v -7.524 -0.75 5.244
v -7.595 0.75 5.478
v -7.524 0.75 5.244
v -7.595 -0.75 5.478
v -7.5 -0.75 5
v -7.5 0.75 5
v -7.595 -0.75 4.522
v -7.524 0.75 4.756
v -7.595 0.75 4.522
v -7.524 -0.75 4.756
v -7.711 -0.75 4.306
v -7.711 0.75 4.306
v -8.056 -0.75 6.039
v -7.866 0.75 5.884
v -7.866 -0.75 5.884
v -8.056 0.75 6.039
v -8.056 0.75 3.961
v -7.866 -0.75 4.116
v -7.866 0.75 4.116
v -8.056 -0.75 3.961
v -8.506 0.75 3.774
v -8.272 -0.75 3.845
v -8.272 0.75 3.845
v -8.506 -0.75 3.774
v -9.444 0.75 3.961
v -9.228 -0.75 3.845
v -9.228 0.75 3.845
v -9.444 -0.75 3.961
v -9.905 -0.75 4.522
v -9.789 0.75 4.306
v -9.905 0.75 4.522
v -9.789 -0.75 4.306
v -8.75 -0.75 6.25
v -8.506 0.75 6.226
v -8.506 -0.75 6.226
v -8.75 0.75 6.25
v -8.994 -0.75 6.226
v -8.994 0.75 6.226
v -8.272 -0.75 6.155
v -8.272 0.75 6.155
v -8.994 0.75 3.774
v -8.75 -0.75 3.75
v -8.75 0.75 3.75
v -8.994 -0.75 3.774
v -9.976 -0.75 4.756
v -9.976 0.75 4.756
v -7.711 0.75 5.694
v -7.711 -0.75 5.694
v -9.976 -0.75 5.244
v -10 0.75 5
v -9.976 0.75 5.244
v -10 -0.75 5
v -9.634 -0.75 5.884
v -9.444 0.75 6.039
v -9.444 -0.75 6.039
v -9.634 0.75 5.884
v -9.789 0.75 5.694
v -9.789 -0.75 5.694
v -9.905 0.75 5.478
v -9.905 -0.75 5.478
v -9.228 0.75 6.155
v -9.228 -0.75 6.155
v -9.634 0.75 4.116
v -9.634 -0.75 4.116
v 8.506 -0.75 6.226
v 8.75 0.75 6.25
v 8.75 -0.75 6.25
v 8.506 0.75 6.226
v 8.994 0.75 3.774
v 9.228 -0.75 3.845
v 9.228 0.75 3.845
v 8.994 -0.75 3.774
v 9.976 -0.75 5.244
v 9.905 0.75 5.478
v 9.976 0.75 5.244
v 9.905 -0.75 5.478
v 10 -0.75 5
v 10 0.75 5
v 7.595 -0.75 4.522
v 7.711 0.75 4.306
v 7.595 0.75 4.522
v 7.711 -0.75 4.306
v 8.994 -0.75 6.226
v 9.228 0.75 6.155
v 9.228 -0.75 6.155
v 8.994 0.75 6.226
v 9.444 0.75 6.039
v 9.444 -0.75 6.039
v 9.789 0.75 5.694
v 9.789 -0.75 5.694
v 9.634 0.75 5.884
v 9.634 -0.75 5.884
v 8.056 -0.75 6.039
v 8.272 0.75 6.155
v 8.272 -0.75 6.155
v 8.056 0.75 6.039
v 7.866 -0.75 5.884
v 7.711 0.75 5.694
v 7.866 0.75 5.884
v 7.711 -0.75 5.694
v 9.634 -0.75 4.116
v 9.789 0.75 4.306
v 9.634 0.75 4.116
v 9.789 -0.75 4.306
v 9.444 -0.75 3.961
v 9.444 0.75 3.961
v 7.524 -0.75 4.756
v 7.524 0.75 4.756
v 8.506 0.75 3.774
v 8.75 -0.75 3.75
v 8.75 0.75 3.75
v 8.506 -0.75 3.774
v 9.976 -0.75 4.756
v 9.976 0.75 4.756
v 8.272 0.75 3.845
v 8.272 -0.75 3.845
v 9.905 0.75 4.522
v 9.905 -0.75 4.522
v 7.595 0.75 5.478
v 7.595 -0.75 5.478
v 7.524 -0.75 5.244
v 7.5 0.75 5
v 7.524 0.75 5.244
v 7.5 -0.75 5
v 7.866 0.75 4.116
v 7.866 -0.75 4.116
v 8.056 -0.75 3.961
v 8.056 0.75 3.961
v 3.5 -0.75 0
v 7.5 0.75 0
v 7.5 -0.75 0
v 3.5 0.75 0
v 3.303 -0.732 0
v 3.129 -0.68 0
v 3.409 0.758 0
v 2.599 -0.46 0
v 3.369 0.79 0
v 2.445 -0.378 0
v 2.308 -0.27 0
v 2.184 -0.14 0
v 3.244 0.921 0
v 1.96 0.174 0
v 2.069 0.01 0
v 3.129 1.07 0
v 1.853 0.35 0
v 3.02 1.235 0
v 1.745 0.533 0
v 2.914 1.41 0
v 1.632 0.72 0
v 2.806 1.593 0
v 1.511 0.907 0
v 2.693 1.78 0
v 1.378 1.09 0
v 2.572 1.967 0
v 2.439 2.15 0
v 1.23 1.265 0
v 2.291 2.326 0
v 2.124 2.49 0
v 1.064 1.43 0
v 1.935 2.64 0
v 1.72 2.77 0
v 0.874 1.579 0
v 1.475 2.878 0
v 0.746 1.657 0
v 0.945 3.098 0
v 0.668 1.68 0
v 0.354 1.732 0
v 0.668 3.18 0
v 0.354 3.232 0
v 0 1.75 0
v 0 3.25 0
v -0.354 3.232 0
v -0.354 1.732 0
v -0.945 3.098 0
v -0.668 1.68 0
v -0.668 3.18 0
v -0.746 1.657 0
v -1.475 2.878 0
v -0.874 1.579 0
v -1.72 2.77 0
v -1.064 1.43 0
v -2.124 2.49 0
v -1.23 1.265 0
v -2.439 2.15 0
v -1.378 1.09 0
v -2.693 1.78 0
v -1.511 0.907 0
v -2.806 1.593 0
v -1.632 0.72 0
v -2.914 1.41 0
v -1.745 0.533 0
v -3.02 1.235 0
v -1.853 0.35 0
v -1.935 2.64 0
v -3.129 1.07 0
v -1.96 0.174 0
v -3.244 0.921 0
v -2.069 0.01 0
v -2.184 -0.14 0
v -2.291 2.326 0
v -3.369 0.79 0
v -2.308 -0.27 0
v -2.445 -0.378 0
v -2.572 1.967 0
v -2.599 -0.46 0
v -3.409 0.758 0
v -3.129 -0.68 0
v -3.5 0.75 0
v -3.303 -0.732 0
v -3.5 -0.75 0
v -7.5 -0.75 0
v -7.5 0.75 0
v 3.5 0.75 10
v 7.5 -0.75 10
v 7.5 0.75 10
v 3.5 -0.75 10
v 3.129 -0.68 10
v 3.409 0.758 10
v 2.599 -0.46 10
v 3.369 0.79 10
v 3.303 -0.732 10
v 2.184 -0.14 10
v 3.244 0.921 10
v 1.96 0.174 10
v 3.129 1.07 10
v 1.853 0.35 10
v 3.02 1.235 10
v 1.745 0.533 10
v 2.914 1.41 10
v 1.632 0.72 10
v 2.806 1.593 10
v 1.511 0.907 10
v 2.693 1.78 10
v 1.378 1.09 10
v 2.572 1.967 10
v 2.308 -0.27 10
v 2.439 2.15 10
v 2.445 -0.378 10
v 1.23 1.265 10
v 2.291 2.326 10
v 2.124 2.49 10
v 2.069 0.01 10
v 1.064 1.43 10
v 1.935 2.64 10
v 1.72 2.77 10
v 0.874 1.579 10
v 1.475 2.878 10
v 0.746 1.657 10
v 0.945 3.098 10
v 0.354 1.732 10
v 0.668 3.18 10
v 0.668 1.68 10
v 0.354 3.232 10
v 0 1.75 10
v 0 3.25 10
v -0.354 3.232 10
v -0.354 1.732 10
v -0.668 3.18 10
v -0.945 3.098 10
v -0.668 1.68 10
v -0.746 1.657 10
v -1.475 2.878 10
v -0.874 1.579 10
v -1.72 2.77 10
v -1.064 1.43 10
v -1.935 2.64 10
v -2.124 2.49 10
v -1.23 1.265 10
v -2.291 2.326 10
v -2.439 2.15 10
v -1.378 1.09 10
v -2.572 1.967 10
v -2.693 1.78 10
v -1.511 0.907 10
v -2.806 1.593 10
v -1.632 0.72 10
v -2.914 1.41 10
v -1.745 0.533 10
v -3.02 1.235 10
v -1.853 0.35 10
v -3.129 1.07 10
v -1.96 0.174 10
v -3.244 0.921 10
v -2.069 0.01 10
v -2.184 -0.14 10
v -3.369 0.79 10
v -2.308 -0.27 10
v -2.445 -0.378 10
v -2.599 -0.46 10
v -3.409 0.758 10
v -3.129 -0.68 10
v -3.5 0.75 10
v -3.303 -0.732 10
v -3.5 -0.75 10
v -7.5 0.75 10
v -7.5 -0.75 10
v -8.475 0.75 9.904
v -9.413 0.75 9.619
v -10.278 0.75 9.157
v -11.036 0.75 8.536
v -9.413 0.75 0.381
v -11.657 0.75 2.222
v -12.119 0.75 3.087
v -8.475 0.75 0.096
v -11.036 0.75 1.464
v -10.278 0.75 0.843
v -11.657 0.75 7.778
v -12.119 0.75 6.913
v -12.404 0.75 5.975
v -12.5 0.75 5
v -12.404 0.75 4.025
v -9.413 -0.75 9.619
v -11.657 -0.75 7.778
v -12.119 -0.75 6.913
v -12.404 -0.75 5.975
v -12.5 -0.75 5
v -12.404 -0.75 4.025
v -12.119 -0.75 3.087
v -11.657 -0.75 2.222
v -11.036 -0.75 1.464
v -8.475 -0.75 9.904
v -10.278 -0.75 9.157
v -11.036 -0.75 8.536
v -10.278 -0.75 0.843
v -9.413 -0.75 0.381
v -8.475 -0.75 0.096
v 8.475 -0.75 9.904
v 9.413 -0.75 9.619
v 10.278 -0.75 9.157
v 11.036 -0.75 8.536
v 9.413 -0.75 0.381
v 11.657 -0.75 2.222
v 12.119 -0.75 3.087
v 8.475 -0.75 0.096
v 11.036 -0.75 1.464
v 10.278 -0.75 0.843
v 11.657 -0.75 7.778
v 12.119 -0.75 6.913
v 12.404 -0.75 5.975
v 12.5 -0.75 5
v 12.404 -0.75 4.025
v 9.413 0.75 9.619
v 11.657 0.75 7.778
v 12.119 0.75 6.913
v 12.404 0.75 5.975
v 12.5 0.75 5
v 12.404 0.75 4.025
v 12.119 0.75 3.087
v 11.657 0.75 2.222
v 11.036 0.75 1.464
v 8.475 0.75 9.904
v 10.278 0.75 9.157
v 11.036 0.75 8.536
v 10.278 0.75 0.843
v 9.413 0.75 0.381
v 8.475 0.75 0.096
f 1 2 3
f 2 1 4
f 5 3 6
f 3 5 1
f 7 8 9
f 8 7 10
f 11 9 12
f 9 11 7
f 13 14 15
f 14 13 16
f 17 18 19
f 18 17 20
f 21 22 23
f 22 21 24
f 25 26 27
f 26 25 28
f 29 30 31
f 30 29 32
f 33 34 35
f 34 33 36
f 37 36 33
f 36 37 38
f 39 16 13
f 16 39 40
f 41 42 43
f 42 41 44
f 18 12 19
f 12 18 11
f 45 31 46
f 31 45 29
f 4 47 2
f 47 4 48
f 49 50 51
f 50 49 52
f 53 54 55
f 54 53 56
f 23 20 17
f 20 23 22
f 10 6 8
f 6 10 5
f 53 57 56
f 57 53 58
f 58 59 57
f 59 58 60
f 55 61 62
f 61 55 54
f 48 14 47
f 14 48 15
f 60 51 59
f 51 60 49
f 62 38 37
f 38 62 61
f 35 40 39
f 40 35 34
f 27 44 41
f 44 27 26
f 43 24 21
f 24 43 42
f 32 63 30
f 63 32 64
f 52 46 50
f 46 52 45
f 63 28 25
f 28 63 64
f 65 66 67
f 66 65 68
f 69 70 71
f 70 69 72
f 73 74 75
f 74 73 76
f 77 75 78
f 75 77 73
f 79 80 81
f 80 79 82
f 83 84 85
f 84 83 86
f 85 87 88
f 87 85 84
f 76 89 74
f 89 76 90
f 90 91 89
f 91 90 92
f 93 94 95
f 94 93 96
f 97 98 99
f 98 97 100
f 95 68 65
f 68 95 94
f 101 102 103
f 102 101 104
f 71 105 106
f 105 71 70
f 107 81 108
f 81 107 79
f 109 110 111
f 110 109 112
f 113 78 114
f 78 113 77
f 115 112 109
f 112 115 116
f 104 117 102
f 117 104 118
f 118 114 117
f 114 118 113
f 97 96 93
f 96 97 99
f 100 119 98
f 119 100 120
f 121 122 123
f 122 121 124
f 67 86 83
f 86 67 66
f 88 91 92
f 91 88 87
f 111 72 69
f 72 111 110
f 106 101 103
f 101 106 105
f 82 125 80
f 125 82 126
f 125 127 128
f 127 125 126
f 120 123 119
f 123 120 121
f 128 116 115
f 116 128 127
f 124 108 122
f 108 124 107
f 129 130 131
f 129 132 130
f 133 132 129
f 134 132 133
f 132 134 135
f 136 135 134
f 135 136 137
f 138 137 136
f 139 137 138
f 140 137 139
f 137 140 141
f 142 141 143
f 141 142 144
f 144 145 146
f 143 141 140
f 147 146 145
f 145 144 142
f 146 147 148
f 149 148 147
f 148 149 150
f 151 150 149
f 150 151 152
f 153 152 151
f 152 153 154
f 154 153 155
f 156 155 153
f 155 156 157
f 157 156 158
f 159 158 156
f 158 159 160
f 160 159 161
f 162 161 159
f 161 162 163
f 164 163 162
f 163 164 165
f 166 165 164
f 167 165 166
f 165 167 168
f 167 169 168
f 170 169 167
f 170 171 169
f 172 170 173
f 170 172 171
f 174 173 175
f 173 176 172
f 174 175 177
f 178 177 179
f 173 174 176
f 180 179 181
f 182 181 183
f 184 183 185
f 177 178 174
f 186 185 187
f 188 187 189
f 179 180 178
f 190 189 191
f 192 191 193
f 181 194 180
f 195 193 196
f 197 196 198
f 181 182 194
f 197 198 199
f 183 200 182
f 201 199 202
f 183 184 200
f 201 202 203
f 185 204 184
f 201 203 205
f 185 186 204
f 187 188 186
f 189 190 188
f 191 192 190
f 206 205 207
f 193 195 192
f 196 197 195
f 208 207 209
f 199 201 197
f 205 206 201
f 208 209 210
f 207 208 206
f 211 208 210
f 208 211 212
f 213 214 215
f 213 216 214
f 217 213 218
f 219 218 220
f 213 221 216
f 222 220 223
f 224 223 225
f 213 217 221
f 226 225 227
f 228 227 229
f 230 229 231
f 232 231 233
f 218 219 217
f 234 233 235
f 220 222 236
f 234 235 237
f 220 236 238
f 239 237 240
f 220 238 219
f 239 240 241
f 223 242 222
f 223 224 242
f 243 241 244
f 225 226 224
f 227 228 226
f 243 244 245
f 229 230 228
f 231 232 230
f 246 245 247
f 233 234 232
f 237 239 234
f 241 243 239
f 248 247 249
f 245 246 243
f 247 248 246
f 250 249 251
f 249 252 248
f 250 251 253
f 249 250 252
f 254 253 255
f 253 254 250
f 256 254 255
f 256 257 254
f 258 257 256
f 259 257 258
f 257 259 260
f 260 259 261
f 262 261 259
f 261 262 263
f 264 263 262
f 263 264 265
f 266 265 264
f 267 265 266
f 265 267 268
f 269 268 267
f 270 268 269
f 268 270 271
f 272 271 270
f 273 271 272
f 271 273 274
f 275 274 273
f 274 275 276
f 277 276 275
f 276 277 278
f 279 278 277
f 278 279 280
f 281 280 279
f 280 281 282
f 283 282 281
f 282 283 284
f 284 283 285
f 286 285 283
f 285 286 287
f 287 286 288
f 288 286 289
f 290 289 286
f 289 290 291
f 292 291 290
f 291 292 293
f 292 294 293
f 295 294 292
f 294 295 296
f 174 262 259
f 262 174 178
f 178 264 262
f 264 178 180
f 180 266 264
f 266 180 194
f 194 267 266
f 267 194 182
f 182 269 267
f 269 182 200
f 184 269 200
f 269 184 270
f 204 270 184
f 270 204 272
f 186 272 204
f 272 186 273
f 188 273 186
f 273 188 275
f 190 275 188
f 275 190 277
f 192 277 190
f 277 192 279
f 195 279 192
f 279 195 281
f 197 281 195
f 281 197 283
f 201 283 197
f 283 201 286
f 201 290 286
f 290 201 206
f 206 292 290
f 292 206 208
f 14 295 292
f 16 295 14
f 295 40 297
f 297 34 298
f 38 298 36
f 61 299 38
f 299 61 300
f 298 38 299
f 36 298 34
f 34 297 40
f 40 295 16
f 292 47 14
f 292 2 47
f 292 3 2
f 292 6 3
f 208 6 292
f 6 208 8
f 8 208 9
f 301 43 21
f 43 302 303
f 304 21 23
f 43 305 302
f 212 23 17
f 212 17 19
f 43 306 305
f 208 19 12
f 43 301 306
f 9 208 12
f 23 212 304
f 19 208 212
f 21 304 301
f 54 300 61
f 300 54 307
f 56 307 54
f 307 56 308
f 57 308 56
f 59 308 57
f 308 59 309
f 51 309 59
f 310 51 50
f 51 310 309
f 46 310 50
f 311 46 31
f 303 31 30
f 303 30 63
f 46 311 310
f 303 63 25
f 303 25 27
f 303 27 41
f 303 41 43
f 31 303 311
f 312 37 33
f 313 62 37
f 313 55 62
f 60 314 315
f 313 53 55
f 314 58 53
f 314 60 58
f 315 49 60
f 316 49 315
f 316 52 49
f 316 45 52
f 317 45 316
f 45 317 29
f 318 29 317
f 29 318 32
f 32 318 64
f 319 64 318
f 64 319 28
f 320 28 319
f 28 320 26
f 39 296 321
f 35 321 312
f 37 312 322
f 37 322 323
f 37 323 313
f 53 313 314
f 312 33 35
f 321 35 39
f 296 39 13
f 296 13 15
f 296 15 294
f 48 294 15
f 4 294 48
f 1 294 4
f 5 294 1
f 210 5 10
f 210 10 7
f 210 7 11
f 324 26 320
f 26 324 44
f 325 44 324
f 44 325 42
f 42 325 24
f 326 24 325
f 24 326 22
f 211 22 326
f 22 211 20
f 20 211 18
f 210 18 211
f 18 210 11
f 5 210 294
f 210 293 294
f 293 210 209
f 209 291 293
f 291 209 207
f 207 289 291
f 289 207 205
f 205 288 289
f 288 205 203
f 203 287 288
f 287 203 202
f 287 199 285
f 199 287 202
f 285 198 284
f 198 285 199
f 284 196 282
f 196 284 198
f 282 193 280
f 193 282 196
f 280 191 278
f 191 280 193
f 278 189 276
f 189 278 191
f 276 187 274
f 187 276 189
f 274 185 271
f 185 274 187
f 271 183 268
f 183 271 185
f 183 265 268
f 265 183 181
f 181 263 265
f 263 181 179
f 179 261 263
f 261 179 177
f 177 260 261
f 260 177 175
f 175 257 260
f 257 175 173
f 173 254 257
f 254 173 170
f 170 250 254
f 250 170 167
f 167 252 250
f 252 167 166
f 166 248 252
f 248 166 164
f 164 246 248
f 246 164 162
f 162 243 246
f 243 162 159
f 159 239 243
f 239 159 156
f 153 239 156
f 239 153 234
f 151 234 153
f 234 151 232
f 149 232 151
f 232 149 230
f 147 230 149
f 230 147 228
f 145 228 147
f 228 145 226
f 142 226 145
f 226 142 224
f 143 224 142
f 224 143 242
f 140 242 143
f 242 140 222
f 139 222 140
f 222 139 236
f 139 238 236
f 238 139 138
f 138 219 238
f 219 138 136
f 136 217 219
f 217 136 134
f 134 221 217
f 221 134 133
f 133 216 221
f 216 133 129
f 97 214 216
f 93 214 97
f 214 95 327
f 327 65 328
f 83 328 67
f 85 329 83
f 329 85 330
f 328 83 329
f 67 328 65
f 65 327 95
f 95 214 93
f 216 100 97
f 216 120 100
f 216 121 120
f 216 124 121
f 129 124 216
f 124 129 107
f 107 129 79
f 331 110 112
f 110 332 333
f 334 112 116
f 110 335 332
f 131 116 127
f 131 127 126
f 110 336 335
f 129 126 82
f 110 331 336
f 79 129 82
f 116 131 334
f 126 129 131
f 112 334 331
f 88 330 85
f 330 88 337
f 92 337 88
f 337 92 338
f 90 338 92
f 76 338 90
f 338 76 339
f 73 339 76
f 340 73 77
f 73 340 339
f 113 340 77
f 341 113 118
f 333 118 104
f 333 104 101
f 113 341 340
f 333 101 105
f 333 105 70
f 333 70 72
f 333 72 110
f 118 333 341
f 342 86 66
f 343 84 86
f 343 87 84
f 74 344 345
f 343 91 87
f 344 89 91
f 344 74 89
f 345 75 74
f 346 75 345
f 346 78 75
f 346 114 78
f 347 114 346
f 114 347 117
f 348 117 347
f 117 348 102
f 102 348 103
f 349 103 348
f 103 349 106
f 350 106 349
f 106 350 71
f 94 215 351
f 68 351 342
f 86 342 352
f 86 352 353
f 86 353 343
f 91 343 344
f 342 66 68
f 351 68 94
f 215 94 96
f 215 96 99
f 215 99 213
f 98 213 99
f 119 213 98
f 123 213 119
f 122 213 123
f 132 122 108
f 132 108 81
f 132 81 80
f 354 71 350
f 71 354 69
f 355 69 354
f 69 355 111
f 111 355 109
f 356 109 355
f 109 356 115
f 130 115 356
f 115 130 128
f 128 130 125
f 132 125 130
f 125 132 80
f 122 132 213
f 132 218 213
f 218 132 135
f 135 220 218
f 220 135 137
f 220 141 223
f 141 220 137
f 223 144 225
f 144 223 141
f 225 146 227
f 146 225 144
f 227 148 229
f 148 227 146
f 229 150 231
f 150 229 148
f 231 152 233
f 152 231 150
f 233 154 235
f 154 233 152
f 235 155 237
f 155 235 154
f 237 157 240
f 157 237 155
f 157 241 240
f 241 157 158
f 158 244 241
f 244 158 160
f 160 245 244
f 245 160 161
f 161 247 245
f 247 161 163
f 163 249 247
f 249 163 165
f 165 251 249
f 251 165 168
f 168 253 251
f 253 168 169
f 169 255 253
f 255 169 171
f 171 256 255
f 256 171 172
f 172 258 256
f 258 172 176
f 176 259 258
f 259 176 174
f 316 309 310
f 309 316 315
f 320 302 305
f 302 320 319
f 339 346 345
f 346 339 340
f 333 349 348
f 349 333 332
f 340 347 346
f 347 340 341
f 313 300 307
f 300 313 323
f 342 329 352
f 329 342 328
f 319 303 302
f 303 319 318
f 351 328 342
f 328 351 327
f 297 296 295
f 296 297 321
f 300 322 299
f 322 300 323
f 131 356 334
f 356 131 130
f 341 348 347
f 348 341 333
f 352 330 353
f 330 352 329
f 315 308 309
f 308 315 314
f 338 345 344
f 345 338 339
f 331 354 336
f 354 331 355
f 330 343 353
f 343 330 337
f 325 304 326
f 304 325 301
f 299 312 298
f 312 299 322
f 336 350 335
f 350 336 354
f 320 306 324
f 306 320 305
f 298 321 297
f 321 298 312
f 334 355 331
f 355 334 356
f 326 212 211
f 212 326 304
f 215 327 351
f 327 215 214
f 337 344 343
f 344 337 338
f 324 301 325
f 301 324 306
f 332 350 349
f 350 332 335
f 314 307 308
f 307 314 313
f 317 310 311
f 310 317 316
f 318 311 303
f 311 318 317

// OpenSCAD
cableDiameter=3.5;
tieThickness=1.5;
tieWidth=10;
tieLength=25;
screwHoleDiameter=2.5;

module end_of_parameters_dummy() {}

//use <bezier.scad>;
/*
Copyright (c) 2017 Alexander R. Pruss.

Licensed under any Creative Commons Attribution license you like or under the
following MIT License.

Permission is hereby granted, free of charge, to any person obtaining a copy
of this software and associated documentation files (the "Software"), to deal
in the Software without restriction, including without limitation the rights
to use, copy, modify, merge, publish, distribute, sublicense, and/or sell
copies of the Software, and to permit persons to whom the Software is
furnished to do so, subject to the following conditions:

The above copyright notice and this permission notice shall be included in all
copies or substantial portions of the Software.

THE SOFTWARE IS PROVIDED "AS IS", WITHOUT WARRANTY OF ANY KIND, EXPRESS OR
IMPLIED, INCLUDING BUT NOT LIMITED TO THE WARRANTIES OF MERCHANTABILITY,
FITNESS FOR A PARTICULAR PURPOSE AND NONINFRINGEMENT. IN NO EVENT SHALL THE
AUTHORS OR COPYRIGHT HOLDERS BE LIABLE FOR ANY CLAIM, DAMAGES OR OTHER
LIABILITY, WHETHER IN AN ACTION OF CONTRACT, TORT OR OTHERWISE, ARISING FROM,
OUT OF OR IN CONNECTION WITH THE SOFTWARE OR THE USE OR OTHER DEALINGS IN THE
SOFTWARE.

*/


// Public domain Bezier stuff from www.thingiverse.com/thing:8443
function BEZ03(u) = pow((1-u), 3);
function BEZ13(u) = 3*u*(pow((1-u),2));
function BEZ23(u) = 3*(pow(u,2))*(1-u);
function BEZ33(u) = pow(u,3);
function PointAlongBez4(p0, p1, p2, p3, u) = [for (i=[0:len(p0)-1])
	BEZ03(u)*p0[i]+BEZ13(u)*p1[i]+BEZ23(u)*p2[i]+BEZ33(u)*p3[i]];
// End public domain Bezier stuff

function REPEAT_MIRRORED(v) = ["m",v];
function SMOOTH_REL(x) = ["r",x];
function SMOOTH_ABS(x) = ["a",x];
function SYMMETRIC() = ["r",1];
function OFFSET(v) = ["o",v];
function SHARP() = OFFSET([0,0,0]);
function POLAR(r,angle) = OFFSET(r*[cos(angle),sin(angle)]);
function POINT_IS_SPECIAL(v) = (v[0]=="r" || v[0]=="a" || v[0]=="o");

// this does NOT handle offset type points; to handle those, use DecodeBezierOffsets()
function getControlPoint(cp,node,otherCP) = cp[0]=="r"?(node+cp[1]*(node-otherCP)):( cp[0]=="a"?node+cp[1]*(node-otherCP)/norm(node-otherCP):cp );

function onLine2(a,b,c,eps=1e-4) =
    norm(c-a) <= eps ? true
        : norm(b-a) <= eps ? false /* to be safe */
            : abs((c[1]-a[1])*(b[0]-a[0]) - (b[1]-a[1])*(c[0]-a[0])) <= eps * eps && norm(c-a) <= eps + norm(b-a);

function isStraight2(p1,c1,c2,p2,eps=1e-4) =
    len(p1) == 2 &&
    onLine2(p1,p2,c1,eps=eps) && onLine2(p2,p1,c2,eps=eps);

function Bezier2(p,index=0,precision=0.05,rightEndPoint=true) = let(nPoints=ceil(1/precision))
    isStraight2(p[index],p[index+1],p[index+2],p[index+3]) ? (rightEndPoint?[p[index+0],p[index+3]]:[p[index+0]] ) :
    [for (i=[0:nPoints-(rightEndPoint?0:1)]) PointAlongBez4(p[index+0],p[index+1],p[index+2],p[index+3],i/nPoints)];

function flatten(listOfLists) = [ for(list = listOfLists) for(item = list) item ];


// p is a list of points, in the format:
// [node1,control1,control2,node2,control3, control4,node3, ...]
// You can replace inner control points with:
//   SYMMETRIC: uses a reflection of the control point on the other side of the node
//   SMOOTH_REL(x): like SYMMETRIC, but the distance of the control point to the node is x times the distance of the other control point to the node
//   SMOOTH_ABS(x): like SYMMETRIC, but the distance of the control point to the node is exactly x
// You can also replace any control point with:
//   OFFSET(v): puts the control point at the corresponding node plus the vector v
//   SHARP(): equivalent to OFFSET([0,0]); useful for straight lines
//   POLAR(r,angle): like OFFSET, except the offset is specified in polar coordinates

function DecodeBezierOffset(control,node) = control[0] == "o" ? node+control[1] : control;

function _mirrorMatrix(normalVector) = let(v = normalVector/norm(normalVector)) len(v)<3 ? [[1-2*v[0]*v[0],-2*v[0]*v[1]],[-2*v[0]*v[1],1-2*v[1]*v[1]]] : [[1-2*v[0]*v[0],-2*v[0]*v[1],-2*v[0]*v[2]],[-2*v[0]*v[1],1-2*v[1]*v[1],-2*v[1]*v[2]],[-2*v[0]*v[2],-2*v[1]*v[2],1-2*v[2]*v[2]]];

function _correctLength(p,start=0) =
    start >= len(p) || p[start][0] == "m" ? 3*floor(start/3)+1 : _correctLength(p,start=start+1);

function _trimArray(a, n) = [for (i=[0:n-1]) a[i]];

function _transformPoint(matrix,a) =
    let(n=len(a))
        len(matrix[0])==n+1 ?
            _trimArray(matrix * concat(a,[1]), n)
            : matrix * a;

function _transformPath(matrix,path) =
    [for (a=path) _transformPoint(matrix,a)];

function _reverseArray(array) = let(n=len(array)) [for (i=[0:n-1]) array[n-1-i]];

function _stitchPaths(a,b) = let(na=len(a)) [for (i=[0:na+len(b)-2]) i<na? a[i] : b[i-na+1]-b[0]+a[na-1]];

// replace all OFFSET/SHARP/POLAR points with coordinates
function DecodeBezierOffsets(p) = [for (i=[0:_correctLength(p)-1]) i%3==0?p[i]:(i%3==1?DecodeBezierOffset(p[i],p[i-1]):DecodeBezierOffset(p[i],p[i+1]))];

function _mirrorPaths(basePath, control, start) =
    control[start][0] == "m" ? _mirrorPaths(_stitchPaths(basePath,_reverseArray(_transformPath(_mirrorMatrix( control[start][1] ),basePath))), control, start+1) : basePath;

function DecodeSpecialBezierPoints(p0) =
    let(
        l = _correctLength(p0),
        doMirror = len(p0)>l && p0[l][0] == "m",
        p=DecodeBezierOffsets(p0),
        basePath = [for (i=[0:l-1]) i%3==0?p[i]:(i%3==1?getControlPoint(p[i],p[i-1],p[i-2]):getControlPoint(p[i],p[i+1],p[i+2]))])
        doMirror ? _mirrorPaths(basePath, p0, l) : basePath;

function Distance2D(a,b) = sqrt((a[0]-b[0])*(a[0]-b[0])+(a[1]-b[1])*(a[1]-b[1]));

function RemoveDuplicates(p,eps=0.00001) = let(safeEps = eps/len(p)) [for (i=[0:len(p)-1]) if(i==0 || i==len(p)-1 || Distance2D(p[i-1],p[i]) >= safeEps) p[i]];

function Bezier(p,precision=0.05,eps=0.00001) = let(q=DecodeSpecialBezierPoints(p), nodes=(len(q)-1)/3) RemoveDuplicates(flatten([for (i=[0:nodes-1]) Bezier2(q,index=i*3,precision=precision,rightEndPoint=(i==nodes-1))]),eps=eps);

module BezierVisualize(p,precision=0.05,eps=0.00001,lineThickness=0.25,controlLineThickness=0.125,nodeSize=1) {
    $fn = 16;
    dim = len(p[0]);
    module point(size) {
        if (dim==2)
            circle(d=size);
        else
            sphere(d=size);
    }
    p1 = DecodeSpecialBezierPoints(p);
    l = Bezier(p1,precision=precision,eps=eps);
    for (i=[0:len(l)-2]) {
        hull() {
            translate(l[i]) point(lineThickness);
            translate(l[i+1]) point(lineThickness);
        }
    }
    for (i=[0:len(p1)-1]) {
        if (i%3 == 0) {
            color("black") translate(p1[i]) point(nodeSize);
        }
        else {
            node = i%3 == 1 ? i-1 : i+1;
            color("red") translate(p1[i]) point(nodeSize);
            color("red") hull() {
                translate(p1[node]) point(controlLineThickness);
                translate(p1[i]) point(controlLineThickness);
            }
        }
    }
}

//use <ribbon.scad>;
module ribbon(points, thickness=1, closed=false) {
    p = closed ? concat(points, [points[0]]) : points;

    union() {
        for (i=[1:len(p)-1]) {
            hull() {
                translate(p[i-1])
                    if ($children==0)
                        circle(d=thickness, $fn=8);
                    else
                        children();
                translate(p[i])
                    if ($children==0)
                        circle(d=thickness, $fn=8);
                    else
                        children();
            }
        }
    }
}

pi = 3.1415926535897932;
function SIN(theta) = sin(theta * 180 / pi);
function COS(theta) = cos(theta * 180 / pi);
function TAN(theta) = tan(theta * 180 / pi);




module dummy() {}

$fn=32;

cableDiameter1 = cableDiameter+2*tieThickness/2;

curve = [ [-tieLength/2,0], OFFSET([tieLength/4,0]),
          OFFSET([-tieLength/4,0]),
          [-cableDiameter1/2-cableDiameter1*.2,0],
          OFFSET([cableDiameter*.4,0]),
          OFFSET([-cableDiameter1*.5,0]),
          [0,cableDiameter1/2],
          REPEAT_MIRRORED([1,0])];


render(convexity=2)
intersection() {
    difference() {
        linear_extrude(height=tieWidth) ribbon(Bezier(curve),tieThickness);
        for(s=[-1:2:1])
           translate([s*tieLength*0.35,0,tieWidth/2])
               rotate([90,0,0]) translate([0,0,-tieThickness*2]) cylinder(d=screwHoleDiameter,h=tieThickness*4);
    }
    translate([0,0,tieWidth/2])
    rotate([90,0,0])
    translate([0,0,-(tieThickness+cableDiameter)*2])
    linear_extrude(h=(tieThickness+cableDiameter)*4)
    hull() {
        translate([-tieLength/2+tieWidth/2,0]) circle(d=tieWidth);
        translate([tieLength/2-tieWidth/2,0]) circle(d=tieWidth);
    }
}
